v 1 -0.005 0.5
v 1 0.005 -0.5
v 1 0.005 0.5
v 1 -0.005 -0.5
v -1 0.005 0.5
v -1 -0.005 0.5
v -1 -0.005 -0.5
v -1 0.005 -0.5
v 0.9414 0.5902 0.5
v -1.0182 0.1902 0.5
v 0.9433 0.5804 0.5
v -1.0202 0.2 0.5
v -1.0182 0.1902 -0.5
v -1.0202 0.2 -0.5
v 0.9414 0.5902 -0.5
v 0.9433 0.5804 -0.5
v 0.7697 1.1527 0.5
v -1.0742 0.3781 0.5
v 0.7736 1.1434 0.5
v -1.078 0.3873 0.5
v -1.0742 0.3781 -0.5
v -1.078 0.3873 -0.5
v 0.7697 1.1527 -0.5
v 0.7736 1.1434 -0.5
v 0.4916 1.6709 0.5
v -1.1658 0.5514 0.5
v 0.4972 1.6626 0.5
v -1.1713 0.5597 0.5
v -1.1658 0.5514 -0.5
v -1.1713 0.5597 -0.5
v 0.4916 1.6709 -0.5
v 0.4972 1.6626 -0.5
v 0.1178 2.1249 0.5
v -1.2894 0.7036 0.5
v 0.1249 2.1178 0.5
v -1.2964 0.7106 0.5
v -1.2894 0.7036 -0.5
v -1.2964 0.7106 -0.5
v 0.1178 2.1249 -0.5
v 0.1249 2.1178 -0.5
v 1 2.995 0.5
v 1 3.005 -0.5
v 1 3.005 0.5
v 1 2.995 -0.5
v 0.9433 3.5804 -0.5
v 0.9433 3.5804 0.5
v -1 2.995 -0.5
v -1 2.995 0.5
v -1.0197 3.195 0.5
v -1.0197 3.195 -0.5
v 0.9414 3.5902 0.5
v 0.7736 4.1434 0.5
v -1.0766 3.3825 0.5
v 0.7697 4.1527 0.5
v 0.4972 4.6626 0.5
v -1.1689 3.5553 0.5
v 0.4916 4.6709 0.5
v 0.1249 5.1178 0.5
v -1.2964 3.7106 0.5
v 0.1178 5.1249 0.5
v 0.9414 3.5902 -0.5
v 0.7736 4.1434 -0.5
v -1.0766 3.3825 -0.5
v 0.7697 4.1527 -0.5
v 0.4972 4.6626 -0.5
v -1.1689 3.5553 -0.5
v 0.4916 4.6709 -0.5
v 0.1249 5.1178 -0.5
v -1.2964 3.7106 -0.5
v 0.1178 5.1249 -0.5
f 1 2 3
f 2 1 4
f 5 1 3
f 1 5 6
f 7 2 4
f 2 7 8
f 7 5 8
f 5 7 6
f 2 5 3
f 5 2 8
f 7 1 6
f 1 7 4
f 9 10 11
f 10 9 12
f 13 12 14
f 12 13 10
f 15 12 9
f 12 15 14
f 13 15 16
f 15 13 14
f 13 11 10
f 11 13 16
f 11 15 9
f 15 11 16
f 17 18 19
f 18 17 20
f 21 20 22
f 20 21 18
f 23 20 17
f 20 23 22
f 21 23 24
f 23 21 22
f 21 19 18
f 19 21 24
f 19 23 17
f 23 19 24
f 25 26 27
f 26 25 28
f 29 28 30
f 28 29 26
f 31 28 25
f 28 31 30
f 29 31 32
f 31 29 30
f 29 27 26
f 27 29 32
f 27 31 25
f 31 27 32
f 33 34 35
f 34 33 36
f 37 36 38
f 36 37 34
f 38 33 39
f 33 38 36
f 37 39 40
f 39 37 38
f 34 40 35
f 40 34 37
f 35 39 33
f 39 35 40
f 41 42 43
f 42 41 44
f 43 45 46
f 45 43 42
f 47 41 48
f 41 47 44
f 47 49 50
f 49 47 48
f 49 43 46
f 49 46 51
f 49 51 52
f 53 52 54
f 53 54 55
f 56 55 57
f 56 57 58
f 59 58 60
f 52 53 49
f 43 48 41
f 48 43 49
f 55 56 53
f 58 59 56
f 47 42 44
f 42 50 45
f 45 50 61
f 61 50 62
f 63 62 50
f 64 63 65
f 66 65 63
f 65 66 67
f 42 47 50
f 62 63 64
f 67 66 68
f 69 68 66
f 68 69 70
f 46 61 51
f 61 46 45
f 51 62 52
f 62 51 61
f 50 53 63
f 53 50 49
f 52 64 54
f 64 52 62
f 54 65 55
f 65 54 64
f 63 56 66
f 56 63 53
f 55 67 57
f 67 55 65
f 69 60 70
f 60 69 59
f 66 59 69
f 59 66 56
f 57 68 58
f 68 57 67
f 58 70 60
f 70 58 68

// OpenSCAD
use <../polychannel.scad>

// Note: all examples use relative coordinates to specify shape positions.

eps = 0.01;
width = 2;
height = 1;

params_arc = [
    each arc_xy("cube", [width, eps, height], radius=2, angle1=0, delta_angle=45, n=4),
];
translate([0, 0, 0]) {
    polychannel(params_arc, clr="Salmon", show_only_shapes=true);
    translate([0, 3, 0]) polychannel(params_arc);
};
